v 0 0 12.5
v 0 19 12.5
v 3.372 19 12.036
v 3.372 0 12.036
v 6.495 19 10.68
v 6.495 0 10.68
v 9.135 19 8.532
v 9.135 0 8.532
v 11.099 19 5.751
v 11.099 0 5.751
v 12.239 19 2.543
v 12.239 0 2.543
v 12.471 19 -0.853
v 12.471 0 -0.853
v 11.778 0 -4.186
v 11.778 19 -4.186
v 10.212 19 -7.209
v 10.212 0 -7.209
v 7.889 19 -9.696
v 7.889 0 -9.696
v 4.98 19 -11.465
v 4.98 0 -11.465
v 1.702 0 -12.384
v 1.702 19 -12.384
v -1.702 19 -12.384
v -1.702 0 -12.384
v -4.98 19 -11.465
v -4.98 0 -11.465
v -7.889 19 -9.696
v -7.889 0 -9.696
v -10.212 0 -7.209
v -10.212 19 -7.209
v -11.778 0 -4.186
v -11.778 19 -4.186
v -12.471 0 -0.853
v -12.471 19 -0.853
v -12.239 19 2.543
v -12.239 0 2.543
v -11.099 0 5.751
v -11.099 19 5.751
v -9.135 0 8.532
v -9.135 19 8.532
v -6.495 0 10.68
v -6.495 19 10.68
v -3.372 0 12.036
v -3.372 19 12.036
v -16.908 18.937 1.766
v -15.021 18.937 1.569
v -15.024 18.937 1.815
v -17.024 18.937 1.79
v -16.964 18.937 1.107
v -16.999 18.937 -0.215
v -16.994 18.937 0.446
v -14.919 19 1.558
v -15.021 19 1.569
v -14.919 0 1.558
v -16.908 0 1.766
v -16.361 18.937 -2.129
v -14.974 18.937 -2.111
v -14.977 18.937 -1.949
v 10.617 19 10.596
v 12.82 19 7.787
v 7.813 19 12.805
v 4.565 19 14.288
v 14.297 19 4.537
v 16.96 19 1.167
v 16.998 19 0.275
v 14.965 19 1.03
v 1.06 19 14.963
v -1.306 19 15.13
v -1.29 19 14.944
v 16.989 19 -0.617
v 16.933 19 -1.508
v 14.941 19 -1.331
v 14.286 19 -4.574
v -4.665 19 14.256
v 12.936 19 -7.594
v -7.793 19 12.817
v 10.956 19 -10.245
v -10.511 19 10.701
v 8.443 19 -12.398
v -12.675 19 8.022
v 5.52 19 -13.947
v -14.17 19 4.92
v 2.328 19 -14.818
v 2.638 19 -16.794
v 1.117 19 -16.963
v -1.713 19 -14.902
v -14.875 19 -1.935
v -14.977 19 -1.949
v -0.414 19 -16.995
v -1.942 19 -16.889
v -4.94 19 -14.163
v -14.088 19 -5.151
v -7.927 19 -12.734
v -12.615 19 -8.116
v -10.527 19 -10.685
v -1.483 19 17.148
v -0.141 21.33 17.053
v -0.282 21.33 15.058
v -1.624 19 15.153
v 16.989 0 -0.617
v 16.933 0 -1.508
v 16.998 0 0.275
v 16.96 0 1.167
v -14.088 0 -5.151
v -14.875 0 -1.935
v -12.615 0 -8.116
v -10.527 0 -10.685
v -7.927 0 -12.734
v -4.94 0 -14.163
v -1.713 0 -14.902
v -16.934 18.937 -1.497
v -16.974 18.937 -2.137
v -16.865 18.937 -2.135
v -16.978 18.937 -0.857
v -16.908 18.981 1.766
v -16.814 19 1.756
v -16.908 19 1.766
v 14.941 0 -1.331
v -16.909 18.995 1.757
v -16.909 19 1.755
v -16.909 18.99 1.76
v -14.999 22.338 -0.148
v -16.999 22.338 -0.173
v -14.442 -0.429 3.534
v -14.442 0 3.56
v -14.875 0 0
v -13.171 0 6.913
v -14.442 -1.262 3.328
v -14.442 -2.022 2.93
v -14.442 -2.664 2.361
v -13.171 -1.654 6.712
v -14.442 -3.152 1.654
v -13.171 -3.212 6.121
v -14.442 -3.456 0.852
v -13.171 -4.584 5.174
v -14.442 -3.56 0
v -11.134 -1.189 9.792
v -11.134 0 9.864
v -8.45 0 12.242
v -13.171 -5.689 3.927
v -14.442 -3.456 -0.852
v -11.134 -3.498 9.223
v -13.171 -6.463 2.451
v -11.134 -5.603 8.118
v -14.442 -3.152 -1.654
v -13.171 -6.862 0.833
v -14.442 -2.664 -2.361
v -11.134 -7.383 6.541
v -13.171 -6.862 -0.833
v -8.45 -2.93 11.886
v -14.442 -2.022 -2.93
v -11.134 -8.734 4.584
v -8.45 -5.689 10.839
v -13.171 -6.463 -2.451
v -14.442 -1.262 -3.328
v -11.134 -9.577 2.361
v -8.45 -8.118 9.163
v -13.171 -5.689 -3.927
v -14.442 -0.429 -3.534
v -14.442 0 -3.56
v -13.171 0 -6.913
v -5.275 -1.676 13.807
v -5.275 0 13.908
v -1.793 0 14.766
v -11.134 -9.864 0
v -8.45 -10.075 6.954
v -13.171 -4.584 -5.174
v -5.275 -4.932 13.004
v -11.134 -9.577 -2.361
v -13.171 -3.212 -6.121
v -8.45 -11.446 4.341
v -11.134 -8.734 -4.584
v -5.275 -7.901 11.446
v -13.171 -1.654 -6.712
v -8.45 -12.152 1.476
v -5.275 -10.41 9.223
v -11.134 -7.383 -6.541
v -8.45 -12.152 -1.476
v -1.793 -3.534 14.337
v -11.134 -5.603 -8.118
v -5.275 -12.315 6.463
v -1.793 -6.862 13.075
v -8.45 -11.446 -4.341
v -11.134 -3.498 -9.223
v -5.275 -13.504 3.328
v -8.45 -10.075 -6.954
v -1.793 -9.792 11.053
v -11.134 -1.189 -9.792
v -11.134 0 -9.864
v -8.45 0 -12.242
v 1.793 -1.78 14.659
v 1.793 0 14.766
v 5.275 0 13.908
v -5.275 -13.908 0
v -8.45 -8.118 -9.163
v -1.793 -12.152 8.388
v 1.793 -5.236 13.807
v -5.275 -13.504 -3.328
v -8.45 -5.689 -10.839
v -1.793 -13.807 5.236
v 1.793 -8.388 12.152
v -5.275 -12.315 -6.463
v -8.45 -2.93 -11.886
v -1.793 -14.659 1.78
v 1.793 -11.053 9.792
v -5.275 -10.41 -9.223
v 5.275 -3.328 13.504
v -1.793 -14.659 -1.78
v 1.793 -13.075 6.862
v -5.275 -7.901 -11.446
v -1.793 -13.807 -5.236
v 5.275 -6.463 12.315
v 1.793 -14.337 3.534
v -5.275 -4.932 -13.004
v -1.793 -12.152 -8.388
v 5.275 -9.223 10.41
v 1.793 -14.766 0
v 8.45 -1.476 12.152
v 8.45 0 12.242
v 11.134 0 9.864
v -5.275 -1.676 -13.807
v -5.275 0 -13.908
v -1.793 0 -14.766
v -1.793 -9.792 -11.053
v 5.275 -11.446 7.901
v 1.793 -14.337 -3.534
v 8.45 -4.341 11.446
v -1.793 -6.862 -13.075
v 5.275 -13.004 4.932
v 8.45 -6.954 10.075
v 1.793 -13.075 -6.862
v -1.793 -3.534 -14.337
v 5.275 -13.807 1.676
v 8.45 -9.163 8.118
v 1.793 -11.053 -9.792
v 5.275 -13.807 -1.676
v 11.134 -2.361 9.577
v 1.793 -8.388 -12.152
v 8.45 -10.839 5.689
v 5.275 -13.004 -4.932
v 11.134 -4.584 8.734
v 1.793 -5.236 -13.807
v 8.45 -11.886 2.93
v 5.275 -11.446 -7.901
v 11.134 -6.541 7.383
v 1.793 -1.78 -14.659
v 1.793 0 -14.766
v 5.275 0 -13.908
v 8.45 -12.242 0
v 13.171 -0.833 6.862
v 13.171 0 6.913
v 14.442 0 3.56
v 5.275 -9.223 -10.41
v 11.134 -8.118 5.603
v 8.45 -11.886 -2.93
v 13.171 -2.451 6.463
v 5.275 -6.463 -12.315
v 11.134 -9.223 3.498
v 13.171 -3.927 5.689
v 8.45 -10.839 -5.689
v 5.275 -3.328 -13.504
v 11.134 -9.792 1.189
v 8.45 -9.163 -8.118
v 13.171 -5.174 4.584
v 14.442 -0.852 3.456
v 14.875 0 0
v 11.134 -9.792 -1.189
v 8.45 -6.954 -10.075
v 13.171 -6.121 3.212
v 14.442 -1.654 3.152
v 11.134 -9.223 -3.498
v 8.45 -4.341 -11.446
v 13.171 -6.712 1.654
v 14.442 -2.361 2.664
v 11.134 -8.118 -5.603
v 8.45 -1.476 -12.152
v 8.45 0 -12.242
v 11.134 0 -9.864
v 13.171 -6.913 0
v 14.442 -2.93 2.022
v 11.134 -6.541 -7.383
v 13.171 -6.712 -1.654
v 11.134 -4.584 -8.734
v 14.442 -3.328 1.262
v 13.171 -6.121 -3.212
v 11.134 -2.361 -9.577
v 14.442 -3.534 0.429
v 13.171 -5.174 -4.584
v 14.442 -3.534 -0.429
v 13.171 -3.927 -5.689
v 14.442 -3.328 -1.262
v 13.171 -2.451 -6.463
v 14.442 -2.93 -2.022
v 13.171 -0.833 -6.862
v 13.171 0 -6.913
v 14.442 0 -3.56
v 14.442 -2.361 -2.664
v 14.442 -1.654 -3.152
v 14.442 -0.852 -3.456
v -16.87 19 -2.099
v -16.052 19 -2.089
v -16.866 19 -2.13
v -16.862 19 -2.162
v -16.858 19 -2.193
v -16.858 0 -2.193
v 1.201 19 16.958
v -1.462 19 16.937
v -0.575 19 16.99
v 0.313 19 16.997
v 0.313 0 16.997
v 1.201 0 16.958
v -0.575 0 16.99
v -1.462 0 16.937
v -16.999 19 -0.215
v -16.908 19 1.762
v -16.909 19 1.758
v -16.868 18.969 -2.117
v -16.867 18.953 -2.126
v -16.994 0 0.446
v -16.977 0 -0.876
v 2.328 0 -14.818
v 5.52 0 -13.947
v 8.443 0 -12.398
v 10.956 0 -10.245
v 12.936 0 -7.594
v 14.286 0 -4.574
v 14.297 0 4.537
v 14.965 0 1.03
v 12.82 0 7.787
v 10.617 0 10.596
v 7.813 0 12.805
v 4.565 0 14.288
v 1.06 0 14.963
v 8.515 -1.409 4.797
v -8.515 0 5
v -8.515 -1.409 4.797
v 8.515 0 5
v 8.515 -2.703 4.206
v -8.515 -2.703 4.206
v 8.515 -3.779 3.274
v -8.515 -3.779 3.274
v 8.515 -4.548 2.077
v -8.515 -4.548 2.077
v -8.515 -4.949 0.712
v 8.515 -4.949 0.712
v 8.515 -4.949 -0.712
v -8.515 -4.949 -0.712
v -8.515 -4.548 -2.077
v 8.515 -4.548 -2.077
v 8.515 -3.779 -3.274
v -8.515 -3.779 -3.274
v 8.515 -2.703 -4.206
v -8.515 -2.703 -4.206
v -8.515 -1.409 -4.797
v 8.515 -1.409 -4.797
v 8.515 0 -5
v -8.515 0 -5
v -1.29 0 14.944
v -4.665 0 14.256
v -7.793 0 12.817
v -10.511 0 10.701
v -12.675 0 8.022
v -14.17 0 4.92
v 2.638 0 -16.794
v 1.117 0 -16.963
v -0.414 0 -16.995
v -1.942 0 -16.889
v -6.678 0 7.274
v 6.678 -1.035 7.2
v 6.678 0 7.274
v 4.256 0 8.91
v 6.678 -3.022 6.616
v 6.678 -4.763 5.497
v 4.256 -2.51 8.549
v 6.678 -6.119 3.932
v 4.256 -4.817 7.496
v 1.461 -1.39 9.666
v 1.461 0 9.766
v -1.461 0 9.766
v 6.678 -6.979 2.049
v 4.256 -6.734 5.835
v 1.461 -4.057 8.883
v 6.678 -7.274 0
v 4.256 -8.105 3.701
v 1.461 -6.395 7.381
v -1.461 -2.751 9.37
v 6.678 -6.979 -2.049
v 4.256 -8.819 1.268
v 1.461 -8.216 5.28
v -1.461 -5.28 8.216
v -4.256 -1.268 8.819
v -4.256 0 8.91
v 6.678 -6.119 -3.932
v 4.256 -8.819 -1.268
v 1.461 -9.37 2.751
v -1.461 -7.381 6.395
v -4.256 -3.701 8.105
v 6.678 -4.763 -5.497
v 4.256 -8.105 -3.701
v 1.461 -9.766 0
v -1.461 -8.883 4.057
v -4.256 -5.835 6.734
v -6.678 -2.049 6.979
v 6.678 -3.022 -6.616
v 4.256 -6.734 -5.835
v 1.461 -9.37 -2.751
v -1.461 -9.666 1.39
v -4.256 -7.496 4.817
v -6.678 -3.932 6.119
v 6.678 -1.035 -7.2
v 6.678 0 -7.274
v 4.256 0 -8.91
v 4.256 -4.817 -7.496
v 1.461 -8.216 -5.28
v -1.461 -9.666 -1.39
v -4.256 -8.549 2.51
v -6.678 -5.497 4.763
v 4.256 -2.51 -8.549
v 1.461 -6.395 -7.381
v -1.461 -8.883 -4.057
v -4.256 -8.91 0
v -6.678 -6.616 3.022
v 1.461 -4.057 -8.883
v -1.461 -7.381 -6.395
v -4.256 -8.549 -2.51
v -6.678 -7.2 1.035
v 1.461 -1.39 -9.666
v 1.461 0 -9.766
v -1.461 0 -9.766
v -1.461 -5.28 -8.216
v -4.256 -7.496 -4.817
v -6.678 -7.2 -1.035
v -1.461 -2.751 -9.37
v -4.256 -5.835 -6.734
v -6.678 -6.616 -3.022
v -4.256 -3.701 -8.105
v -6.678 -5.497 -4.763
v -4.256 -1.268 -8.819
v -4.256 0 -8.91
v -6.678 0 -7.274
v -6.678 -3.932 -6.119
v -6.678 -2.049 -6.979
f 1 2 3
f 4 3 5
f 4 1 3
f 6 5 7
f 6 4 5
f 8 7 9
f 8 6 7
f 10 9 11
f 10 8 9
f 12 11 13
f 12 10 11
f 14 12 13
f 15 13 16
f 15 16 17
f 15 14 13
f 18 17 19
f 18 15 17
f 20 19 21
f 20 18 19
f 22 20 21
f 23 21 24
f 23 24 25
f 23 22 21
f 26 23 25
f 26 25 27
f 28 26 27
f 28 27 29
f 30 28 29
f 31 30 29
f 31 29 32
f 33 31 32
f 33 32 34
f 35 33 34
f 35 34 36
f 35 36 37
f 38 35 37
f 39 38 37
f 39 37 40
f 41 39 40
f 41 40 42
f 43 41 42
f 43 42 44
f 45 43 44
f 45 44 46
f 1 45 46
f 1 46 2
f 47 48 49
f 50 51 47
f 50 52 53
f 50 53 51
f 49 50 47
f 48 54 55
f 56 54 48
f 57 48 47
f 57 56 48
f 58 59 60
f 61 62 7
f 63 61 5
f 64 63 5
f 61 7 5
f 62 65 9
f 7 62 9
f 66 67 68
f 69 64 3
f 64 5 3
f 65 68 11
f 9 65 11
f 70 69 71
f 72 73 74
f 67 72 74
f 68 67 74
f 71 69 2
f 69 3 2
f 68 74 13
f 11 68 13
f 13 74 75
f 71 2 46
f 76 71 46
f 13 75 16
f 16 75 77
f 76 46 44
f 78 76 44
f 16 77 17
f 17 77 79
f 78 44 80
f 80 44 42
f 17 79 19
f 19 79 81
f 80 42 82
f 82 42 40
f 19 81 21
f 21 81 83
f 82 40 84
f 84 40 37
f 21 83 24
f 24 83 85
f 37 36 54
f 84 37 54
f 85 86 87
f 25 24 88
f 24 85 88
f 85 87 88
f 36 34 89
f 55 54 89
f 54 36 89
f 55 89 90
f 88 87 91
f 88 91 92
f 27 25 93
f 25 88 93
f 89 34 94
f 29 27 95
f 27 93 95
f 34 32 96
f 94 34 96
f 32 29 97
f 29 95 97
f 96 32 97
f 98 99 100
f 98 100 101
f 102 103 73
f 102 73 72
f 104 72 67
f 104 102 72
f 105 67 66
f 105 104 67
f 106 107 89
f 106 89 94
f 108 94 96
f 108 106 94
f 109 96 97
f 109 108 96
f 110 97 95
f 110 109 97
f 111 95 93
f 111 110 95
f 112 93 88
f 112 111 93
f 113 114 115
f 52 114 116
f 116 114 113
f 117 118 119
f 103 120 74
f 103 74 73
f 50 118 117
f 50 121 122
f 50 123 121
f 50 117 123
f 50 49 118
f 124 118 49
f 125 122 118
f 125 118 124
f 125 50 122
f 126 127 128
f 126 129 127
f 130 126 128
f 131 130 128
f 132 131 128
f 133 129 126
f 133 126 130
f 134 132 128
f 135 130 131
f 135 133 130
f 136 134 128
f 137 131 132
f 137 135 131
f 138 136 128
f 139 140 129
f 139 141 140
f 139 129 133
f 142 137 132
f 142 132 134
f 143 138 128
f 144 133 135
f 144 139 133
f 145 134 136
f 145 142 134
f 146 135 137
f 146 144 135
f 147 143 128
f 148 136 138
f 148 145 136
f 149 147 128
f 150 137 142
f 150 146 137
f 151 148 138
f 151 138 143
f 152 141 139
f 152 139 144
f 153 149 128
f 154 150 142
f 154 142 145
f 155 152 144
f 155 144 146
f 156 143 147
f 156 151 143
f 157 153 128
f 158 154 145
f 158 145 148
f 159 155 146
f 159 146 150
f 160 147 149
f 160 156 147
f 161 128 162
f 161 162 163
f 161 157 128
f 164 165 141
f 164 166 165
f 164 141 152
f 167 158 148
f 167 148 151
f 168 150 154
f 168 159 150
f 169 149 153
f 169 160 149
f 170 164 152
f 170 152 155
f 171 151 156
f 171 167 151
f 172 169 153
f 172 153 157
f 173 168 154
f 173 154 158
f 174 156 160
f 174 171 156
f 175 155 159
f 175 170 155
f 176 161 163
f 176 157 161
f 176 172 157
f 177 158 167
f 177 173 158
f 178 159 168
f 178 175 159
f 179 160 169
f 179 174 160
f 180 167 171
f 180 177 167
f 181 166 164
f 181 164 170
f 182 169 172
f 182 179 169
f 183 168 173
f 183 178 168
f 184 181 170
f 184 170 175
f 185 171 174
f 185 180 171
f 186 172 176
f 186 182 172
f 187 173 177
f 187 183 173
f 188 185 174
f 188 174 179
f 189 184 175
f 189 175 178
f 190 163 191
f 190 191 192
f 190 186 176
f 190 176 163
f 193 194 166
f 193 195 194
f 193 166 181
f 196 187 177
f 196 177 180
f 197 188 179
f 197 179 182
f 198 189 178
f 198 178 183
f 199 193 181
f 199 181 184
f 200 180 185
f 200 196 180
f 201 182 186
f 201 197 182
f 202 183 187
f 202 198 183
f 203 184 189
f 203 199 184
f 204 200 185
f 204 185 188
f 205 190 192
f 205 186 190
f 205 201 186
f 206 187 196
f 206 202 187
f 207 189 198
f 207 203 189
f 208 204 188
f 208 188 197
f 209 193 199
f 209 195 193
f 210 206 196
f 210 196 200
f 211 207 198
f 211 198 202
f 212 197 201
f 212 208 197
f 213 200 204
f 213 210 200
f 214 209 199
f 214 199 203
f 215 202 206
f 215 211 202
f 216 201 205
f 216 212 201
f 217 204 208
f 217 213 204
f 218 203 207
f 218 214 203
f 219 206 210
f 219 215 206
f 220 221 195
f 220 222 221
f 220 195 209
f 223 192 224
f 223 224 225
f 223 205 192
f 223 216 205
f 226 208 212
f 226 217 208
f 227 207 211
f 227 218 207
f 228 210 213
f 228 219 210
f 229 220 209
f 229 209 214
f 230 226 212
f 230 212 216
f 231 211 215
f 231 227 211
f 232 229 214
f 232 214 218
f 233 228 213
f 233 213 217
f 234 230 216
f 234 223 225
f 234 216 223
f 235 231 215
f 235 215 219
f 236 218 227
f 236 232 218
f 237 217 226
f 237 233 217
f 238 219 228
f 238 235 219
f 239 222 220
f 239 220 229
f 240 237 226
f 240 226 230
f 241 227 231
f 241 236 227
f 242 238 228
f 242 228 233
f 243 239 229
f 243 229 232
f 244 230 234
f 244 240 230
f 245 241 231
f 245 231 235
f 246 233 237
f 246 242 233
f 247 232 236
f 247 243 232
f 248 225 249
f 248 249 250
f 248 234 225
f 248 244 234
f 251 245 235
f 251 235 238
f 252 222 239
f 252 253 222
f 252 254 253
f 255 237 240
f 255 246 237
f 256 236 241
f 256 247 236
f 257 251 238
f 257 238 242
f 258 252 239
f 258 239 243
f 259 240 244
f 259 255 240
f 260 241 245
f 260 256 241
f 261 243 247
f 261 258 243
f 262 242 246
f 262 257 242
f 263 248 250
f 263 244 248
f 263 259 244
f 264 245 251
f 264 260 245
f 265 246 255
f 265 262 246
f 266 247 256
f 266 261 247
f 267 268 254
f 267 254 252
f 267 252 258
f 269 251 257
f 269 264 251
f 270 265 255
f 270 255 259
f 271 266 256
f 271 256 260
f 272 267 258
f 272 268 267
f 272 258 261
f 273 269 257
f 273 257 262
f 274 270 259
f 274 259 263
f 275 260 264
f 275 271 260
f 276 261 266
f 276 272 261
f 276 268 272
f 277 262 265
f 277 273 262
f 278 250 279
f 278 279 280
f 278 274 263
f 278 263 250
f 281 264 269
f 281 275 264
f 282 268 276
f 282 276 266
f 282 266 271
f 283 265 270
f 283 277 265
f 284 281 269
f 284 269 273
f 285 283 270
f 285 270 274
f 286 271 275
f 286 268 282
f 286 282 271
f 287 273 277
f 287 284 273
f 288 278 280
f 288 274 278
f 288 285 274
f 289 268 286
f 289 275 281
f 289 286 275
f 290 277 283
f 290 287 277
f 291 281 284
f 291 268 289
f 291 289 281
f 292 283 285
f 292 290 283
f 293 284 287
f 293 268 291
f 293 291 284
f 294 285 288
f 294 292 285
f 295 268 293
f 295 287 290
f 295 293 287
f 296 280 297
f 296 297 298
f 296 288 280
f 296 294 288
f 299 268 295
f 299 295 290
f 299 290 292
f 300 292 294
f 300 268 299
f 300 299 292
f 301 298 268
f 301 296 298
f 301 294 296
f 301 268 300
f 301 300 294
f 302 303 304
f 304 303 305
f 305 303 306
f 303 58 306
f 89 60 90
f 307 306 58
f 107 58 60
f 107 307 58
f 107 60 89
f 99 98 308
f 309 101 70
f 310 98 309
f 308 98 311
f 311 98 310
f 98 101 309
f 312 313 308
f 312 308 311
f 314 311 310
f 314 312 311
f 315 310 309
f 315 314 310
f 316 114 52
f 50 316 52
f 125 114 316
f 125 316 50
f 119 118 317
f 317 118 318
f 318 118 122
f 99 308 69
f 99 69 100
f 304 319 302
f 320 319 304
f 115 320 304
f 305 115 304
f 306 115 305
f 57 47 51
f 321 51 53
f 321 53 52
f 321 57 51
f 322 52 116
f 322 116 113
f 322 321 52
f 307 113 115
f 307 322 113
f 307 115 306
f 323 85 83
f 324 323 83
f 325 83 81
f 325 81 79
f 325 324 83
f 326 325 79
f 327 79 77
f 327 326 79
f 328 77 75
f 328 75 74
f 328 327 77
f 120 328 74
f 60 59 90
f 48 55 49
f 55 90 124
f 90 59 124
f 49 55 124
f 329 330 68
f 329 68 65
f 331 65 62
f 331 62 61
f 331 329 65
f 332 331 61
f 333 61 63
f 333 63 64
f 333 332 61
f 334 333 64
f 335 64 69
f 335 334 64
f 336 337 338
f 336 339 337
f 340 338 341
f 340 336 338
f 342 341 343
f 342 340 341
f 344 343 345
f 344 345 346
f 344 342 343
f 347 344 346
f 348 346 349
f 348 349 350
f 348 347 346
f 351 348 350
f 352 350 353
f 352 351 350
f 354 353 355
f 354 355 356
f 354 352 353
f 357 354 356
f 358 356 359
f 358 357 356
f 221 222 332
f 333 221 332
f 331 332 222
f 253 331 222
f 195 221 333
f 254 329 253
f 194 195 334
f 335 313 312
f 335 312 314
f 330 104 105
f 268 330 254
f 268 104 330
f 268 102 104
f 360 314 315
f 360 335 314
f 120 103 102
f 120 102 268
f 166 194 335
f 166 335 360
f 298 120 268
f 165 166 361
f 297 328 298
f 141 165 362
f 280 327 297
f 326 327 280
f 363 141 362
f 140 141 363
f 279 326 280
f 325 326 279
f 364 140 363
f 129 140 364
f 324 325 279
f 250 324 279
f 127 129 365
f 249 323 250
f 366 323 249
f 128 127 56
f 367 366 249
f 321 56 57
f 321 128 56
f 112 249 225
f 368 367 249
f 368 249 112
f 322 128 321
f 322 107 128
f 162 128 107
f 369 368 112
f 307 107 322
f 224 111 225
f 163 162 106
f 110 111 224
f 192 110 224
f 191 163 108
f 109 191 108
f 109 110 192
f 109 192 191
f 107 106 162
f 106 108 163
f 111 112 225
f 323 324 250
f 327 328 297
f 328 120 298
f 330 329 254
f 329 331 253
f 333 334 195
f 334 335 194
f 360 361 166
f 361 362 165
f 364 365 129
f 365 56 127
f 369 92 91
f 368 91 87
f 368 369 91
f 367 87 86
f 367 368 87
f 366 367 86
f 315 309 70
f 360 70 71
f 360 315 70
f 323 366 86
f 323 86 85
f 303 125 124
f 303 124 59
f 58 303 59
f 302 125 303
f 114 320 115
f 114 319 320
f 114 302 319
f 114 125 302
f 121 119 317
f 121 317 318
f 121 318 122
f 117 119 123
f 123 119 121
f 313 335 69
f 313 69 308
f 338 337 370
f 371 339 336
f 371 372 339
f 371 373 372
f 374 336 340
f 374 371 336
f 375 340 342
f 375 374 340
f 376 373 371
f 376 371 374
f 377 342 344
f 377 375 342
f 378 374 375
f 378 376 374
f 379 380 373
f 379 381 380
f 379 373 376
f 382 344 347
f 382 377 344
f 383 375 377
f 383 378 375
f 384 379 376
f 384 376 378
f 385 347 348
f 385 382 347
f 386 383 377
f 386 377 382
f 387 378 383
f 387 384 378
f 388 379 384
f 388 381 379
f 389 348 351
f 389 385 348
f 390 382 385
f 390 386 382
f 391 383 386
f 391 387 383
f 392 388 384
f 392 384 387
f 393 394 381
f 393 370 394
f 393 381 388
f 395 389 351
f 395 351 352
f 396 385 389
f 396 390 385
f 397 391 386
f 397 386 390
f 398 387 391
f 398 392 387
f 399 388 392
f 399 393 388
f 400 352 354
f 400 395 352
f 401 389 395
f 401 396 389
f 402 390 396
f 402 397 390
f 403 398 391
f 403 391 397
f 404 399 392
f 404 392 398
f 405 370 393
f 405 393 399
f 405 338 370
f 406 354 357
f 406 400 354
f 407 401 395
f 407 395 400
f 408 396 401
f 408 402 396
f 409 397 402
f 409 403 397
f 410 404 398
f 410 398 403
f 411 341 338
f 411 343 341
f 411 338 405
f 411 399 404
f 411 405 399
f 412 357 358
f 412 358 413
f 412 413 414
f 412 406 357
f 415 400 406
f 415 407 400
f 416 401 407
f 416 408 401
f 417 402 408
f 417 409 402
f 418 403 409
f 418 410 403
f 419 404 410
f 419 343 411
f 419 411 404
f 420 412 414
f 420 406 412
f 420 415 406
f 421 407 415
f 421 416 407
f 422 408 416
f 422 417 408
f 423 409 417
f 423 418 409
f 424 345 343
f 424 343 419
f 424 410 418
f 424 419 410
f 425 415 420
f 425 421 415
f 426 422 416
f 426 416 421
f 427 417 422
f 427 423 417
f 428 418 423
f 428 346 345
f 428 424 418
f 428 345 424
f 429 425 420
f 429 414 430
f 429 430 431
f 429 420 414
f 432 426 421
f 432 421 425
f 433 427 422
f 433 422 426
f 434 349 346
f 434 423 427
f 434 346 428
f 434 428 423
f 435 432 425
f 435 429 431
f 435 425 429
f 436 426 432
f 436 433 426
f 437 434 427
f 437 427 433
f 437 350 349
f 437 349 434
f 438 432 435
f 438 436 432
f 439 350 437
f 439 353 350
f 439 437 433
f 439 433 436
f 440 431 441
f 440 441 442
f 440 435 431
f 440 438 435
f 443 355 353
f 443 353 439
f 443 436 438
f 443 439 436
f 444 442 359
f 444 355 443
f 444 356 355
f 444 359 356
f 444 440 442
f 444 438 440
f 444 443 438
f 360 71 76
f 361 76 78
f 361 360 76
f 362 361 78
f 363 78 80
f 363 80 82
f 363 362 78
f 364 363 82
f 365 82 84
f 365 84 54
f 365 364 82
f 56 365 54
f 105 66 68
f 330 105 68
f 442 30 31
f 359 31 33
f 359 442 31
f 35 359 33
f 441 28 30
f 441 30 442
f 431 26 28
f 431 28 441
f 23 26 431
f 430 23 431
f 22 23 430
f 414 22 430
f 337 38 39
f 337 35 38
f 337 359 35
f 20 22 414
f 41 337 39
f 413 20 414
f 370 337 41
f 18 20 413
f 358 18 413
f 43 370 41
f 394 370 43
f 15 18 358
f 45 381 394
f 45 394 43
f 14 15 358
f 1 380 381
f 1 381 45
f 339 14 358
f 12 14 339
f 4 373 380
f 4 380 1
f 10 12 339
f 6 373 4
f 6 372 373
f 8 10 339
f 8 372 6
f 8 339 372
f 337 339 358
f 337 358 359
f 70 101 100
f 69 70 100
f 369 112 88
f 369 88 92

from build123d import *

# Parameters (mm, degrees)
SKETCH1_R           = 12.5
BOSS_EXTRUDE1_DEPTH = 19
REVOLVE_THIN8_ANGLE = 180
BOSS_EXTRUDE4_DEPTH = 2
BOSS_EXTRUDE5_DEPTH = 2


# Read off the part's stored shape, not the designer's step: Revolve-Thin8
with BuildPart() as part:
    # Sketch1 → Boss-Extrude1 (new body)
    with BuildSketch(Plane(origin=(0, 0, 0), x_dir=(1, 0, 0), z_dir=(0, 1, 0))):
        with BuildLine():
            Line((-16.857907097, 2.193391967), (-14.874623909, 1.935345853))
            ThreePointArc((-14.874623909, 1.935345853), (-10.527218249, 10.68539545), (-1.713310211, 14.901831032))
            Line((-1.713310211, 14.901831032), (-1.941751573, 16.888741837))
            ThreePointArc((-1.941751573, 16.888741837), (0.351548962, 16.996364709), (2.638437912, 16.794006234))
            Line((2.638437912, 16.794006234), (2.328033452, 14.818240795))
            ThreePointArc((2.328033452, 14.818240795), (10.955949894, 10.245348306), (14.940866835, 1.330600703))
            Line((14.940866835, 1.330600703), (16.932982413, 1.50801413))
            ThreePointArc((16.932982413, 1.50801413), (16.999139456, 0.171049014), (16.959898748, -1.166976638))
            Line((16.959898748, -1.166976638), (14.964616542, -1.029685269))
            ThreePointArc((14.964616542, -1.029685269), (10.617208635, -10.595984183), (1.059628295, -14.962526119))
            Line((1.059628295, -14.962526119), (1.200912068, -16.957529602))
            ThreePointArc((1.200912068, -16.957529602), (-0.131031268, -16.999495016), (-1.462169449, -16.937002701))
            Line((-1.462169449, -16.937002701), (-1.290149514, -14.944414148))
            ThreePointArc((-1.290149514, -14.944414148), (-10.511046509, -10.701303719), (-14.91886862, -1.557998423))
            Line((-14.91886862, -1.557998423), (-16.908051103, -1.765731546))
            ThreePointArc((-16.908051103, -1.765731546), (-16.998636652, 0.215295063), (-16.857907097, 2.193391967))
        make_face()
        with Locations(Location((0, 0, 0), (0, 0, 270))):
            Circle(SKETCH1_R, mode=Mode.SUBTRACT)
    extrude(amount=BOSS_EXTRUDE1_DEPTH)

    # Revolve-Thin8 outline → Revolve-Thin8 (revolve)
    with BuildSketch(Plane.ZX):
        with BuildLine():
            ThreePointArc((0, -14.874623909), (14.874623909, 0), (0, 14.874623909))
            Line((0, 14.874623909), (0, -14.874623909))
        make_face()
        with BuildLine():
            Line((5, -8.515174534), (5, 8.515174534))
            ThreePointArc((5, 8.515174534), (9.874623909, 0), (5, -8.515174534))
        make_face(mode=Mode.SUBTRACT)
    revolve(axis=Axis((0, 0, 0), (1, 0, 0)), revolution_arc=REVOLVE_THIN8_ANGLE)

    # Sketch6 → Boss-Extrude4 (add)
    with BuildSketch(Plane(origin=(1.200912068, 9.5, 16.957529602), x_dir=(0.9975017412997444, 0, -0.0706418863279974), z_dir=(0.0706418863279974, 0, 0.9975017412997444))):
        Polygon((0, 9.5), (-1.345294106, 11.830117743), (-2.690588212, 9.5), align=None)
    extrude(amount=-BOSS_EXTRUDE4_DEPTH)

    # Sketch7 → Boss-Extrude5 (add)
    with BuildSketch(Plane(origin=(-16.998636652, 0, -0.215295063), x_dir=(-0.012664415486466005, 0, 0.9999198030744196), z_dir=(-0.9999198030744197, 0, -0.012664415486466006))):
        Polygon((-1.921412098, 18.937041844), (2.005099018, 18.937041844), (0.04184346, 22.337500219), align=None)
    extrude(amount=-BOSS_EXTRUDE5_DEPTH)


solid = part.part
